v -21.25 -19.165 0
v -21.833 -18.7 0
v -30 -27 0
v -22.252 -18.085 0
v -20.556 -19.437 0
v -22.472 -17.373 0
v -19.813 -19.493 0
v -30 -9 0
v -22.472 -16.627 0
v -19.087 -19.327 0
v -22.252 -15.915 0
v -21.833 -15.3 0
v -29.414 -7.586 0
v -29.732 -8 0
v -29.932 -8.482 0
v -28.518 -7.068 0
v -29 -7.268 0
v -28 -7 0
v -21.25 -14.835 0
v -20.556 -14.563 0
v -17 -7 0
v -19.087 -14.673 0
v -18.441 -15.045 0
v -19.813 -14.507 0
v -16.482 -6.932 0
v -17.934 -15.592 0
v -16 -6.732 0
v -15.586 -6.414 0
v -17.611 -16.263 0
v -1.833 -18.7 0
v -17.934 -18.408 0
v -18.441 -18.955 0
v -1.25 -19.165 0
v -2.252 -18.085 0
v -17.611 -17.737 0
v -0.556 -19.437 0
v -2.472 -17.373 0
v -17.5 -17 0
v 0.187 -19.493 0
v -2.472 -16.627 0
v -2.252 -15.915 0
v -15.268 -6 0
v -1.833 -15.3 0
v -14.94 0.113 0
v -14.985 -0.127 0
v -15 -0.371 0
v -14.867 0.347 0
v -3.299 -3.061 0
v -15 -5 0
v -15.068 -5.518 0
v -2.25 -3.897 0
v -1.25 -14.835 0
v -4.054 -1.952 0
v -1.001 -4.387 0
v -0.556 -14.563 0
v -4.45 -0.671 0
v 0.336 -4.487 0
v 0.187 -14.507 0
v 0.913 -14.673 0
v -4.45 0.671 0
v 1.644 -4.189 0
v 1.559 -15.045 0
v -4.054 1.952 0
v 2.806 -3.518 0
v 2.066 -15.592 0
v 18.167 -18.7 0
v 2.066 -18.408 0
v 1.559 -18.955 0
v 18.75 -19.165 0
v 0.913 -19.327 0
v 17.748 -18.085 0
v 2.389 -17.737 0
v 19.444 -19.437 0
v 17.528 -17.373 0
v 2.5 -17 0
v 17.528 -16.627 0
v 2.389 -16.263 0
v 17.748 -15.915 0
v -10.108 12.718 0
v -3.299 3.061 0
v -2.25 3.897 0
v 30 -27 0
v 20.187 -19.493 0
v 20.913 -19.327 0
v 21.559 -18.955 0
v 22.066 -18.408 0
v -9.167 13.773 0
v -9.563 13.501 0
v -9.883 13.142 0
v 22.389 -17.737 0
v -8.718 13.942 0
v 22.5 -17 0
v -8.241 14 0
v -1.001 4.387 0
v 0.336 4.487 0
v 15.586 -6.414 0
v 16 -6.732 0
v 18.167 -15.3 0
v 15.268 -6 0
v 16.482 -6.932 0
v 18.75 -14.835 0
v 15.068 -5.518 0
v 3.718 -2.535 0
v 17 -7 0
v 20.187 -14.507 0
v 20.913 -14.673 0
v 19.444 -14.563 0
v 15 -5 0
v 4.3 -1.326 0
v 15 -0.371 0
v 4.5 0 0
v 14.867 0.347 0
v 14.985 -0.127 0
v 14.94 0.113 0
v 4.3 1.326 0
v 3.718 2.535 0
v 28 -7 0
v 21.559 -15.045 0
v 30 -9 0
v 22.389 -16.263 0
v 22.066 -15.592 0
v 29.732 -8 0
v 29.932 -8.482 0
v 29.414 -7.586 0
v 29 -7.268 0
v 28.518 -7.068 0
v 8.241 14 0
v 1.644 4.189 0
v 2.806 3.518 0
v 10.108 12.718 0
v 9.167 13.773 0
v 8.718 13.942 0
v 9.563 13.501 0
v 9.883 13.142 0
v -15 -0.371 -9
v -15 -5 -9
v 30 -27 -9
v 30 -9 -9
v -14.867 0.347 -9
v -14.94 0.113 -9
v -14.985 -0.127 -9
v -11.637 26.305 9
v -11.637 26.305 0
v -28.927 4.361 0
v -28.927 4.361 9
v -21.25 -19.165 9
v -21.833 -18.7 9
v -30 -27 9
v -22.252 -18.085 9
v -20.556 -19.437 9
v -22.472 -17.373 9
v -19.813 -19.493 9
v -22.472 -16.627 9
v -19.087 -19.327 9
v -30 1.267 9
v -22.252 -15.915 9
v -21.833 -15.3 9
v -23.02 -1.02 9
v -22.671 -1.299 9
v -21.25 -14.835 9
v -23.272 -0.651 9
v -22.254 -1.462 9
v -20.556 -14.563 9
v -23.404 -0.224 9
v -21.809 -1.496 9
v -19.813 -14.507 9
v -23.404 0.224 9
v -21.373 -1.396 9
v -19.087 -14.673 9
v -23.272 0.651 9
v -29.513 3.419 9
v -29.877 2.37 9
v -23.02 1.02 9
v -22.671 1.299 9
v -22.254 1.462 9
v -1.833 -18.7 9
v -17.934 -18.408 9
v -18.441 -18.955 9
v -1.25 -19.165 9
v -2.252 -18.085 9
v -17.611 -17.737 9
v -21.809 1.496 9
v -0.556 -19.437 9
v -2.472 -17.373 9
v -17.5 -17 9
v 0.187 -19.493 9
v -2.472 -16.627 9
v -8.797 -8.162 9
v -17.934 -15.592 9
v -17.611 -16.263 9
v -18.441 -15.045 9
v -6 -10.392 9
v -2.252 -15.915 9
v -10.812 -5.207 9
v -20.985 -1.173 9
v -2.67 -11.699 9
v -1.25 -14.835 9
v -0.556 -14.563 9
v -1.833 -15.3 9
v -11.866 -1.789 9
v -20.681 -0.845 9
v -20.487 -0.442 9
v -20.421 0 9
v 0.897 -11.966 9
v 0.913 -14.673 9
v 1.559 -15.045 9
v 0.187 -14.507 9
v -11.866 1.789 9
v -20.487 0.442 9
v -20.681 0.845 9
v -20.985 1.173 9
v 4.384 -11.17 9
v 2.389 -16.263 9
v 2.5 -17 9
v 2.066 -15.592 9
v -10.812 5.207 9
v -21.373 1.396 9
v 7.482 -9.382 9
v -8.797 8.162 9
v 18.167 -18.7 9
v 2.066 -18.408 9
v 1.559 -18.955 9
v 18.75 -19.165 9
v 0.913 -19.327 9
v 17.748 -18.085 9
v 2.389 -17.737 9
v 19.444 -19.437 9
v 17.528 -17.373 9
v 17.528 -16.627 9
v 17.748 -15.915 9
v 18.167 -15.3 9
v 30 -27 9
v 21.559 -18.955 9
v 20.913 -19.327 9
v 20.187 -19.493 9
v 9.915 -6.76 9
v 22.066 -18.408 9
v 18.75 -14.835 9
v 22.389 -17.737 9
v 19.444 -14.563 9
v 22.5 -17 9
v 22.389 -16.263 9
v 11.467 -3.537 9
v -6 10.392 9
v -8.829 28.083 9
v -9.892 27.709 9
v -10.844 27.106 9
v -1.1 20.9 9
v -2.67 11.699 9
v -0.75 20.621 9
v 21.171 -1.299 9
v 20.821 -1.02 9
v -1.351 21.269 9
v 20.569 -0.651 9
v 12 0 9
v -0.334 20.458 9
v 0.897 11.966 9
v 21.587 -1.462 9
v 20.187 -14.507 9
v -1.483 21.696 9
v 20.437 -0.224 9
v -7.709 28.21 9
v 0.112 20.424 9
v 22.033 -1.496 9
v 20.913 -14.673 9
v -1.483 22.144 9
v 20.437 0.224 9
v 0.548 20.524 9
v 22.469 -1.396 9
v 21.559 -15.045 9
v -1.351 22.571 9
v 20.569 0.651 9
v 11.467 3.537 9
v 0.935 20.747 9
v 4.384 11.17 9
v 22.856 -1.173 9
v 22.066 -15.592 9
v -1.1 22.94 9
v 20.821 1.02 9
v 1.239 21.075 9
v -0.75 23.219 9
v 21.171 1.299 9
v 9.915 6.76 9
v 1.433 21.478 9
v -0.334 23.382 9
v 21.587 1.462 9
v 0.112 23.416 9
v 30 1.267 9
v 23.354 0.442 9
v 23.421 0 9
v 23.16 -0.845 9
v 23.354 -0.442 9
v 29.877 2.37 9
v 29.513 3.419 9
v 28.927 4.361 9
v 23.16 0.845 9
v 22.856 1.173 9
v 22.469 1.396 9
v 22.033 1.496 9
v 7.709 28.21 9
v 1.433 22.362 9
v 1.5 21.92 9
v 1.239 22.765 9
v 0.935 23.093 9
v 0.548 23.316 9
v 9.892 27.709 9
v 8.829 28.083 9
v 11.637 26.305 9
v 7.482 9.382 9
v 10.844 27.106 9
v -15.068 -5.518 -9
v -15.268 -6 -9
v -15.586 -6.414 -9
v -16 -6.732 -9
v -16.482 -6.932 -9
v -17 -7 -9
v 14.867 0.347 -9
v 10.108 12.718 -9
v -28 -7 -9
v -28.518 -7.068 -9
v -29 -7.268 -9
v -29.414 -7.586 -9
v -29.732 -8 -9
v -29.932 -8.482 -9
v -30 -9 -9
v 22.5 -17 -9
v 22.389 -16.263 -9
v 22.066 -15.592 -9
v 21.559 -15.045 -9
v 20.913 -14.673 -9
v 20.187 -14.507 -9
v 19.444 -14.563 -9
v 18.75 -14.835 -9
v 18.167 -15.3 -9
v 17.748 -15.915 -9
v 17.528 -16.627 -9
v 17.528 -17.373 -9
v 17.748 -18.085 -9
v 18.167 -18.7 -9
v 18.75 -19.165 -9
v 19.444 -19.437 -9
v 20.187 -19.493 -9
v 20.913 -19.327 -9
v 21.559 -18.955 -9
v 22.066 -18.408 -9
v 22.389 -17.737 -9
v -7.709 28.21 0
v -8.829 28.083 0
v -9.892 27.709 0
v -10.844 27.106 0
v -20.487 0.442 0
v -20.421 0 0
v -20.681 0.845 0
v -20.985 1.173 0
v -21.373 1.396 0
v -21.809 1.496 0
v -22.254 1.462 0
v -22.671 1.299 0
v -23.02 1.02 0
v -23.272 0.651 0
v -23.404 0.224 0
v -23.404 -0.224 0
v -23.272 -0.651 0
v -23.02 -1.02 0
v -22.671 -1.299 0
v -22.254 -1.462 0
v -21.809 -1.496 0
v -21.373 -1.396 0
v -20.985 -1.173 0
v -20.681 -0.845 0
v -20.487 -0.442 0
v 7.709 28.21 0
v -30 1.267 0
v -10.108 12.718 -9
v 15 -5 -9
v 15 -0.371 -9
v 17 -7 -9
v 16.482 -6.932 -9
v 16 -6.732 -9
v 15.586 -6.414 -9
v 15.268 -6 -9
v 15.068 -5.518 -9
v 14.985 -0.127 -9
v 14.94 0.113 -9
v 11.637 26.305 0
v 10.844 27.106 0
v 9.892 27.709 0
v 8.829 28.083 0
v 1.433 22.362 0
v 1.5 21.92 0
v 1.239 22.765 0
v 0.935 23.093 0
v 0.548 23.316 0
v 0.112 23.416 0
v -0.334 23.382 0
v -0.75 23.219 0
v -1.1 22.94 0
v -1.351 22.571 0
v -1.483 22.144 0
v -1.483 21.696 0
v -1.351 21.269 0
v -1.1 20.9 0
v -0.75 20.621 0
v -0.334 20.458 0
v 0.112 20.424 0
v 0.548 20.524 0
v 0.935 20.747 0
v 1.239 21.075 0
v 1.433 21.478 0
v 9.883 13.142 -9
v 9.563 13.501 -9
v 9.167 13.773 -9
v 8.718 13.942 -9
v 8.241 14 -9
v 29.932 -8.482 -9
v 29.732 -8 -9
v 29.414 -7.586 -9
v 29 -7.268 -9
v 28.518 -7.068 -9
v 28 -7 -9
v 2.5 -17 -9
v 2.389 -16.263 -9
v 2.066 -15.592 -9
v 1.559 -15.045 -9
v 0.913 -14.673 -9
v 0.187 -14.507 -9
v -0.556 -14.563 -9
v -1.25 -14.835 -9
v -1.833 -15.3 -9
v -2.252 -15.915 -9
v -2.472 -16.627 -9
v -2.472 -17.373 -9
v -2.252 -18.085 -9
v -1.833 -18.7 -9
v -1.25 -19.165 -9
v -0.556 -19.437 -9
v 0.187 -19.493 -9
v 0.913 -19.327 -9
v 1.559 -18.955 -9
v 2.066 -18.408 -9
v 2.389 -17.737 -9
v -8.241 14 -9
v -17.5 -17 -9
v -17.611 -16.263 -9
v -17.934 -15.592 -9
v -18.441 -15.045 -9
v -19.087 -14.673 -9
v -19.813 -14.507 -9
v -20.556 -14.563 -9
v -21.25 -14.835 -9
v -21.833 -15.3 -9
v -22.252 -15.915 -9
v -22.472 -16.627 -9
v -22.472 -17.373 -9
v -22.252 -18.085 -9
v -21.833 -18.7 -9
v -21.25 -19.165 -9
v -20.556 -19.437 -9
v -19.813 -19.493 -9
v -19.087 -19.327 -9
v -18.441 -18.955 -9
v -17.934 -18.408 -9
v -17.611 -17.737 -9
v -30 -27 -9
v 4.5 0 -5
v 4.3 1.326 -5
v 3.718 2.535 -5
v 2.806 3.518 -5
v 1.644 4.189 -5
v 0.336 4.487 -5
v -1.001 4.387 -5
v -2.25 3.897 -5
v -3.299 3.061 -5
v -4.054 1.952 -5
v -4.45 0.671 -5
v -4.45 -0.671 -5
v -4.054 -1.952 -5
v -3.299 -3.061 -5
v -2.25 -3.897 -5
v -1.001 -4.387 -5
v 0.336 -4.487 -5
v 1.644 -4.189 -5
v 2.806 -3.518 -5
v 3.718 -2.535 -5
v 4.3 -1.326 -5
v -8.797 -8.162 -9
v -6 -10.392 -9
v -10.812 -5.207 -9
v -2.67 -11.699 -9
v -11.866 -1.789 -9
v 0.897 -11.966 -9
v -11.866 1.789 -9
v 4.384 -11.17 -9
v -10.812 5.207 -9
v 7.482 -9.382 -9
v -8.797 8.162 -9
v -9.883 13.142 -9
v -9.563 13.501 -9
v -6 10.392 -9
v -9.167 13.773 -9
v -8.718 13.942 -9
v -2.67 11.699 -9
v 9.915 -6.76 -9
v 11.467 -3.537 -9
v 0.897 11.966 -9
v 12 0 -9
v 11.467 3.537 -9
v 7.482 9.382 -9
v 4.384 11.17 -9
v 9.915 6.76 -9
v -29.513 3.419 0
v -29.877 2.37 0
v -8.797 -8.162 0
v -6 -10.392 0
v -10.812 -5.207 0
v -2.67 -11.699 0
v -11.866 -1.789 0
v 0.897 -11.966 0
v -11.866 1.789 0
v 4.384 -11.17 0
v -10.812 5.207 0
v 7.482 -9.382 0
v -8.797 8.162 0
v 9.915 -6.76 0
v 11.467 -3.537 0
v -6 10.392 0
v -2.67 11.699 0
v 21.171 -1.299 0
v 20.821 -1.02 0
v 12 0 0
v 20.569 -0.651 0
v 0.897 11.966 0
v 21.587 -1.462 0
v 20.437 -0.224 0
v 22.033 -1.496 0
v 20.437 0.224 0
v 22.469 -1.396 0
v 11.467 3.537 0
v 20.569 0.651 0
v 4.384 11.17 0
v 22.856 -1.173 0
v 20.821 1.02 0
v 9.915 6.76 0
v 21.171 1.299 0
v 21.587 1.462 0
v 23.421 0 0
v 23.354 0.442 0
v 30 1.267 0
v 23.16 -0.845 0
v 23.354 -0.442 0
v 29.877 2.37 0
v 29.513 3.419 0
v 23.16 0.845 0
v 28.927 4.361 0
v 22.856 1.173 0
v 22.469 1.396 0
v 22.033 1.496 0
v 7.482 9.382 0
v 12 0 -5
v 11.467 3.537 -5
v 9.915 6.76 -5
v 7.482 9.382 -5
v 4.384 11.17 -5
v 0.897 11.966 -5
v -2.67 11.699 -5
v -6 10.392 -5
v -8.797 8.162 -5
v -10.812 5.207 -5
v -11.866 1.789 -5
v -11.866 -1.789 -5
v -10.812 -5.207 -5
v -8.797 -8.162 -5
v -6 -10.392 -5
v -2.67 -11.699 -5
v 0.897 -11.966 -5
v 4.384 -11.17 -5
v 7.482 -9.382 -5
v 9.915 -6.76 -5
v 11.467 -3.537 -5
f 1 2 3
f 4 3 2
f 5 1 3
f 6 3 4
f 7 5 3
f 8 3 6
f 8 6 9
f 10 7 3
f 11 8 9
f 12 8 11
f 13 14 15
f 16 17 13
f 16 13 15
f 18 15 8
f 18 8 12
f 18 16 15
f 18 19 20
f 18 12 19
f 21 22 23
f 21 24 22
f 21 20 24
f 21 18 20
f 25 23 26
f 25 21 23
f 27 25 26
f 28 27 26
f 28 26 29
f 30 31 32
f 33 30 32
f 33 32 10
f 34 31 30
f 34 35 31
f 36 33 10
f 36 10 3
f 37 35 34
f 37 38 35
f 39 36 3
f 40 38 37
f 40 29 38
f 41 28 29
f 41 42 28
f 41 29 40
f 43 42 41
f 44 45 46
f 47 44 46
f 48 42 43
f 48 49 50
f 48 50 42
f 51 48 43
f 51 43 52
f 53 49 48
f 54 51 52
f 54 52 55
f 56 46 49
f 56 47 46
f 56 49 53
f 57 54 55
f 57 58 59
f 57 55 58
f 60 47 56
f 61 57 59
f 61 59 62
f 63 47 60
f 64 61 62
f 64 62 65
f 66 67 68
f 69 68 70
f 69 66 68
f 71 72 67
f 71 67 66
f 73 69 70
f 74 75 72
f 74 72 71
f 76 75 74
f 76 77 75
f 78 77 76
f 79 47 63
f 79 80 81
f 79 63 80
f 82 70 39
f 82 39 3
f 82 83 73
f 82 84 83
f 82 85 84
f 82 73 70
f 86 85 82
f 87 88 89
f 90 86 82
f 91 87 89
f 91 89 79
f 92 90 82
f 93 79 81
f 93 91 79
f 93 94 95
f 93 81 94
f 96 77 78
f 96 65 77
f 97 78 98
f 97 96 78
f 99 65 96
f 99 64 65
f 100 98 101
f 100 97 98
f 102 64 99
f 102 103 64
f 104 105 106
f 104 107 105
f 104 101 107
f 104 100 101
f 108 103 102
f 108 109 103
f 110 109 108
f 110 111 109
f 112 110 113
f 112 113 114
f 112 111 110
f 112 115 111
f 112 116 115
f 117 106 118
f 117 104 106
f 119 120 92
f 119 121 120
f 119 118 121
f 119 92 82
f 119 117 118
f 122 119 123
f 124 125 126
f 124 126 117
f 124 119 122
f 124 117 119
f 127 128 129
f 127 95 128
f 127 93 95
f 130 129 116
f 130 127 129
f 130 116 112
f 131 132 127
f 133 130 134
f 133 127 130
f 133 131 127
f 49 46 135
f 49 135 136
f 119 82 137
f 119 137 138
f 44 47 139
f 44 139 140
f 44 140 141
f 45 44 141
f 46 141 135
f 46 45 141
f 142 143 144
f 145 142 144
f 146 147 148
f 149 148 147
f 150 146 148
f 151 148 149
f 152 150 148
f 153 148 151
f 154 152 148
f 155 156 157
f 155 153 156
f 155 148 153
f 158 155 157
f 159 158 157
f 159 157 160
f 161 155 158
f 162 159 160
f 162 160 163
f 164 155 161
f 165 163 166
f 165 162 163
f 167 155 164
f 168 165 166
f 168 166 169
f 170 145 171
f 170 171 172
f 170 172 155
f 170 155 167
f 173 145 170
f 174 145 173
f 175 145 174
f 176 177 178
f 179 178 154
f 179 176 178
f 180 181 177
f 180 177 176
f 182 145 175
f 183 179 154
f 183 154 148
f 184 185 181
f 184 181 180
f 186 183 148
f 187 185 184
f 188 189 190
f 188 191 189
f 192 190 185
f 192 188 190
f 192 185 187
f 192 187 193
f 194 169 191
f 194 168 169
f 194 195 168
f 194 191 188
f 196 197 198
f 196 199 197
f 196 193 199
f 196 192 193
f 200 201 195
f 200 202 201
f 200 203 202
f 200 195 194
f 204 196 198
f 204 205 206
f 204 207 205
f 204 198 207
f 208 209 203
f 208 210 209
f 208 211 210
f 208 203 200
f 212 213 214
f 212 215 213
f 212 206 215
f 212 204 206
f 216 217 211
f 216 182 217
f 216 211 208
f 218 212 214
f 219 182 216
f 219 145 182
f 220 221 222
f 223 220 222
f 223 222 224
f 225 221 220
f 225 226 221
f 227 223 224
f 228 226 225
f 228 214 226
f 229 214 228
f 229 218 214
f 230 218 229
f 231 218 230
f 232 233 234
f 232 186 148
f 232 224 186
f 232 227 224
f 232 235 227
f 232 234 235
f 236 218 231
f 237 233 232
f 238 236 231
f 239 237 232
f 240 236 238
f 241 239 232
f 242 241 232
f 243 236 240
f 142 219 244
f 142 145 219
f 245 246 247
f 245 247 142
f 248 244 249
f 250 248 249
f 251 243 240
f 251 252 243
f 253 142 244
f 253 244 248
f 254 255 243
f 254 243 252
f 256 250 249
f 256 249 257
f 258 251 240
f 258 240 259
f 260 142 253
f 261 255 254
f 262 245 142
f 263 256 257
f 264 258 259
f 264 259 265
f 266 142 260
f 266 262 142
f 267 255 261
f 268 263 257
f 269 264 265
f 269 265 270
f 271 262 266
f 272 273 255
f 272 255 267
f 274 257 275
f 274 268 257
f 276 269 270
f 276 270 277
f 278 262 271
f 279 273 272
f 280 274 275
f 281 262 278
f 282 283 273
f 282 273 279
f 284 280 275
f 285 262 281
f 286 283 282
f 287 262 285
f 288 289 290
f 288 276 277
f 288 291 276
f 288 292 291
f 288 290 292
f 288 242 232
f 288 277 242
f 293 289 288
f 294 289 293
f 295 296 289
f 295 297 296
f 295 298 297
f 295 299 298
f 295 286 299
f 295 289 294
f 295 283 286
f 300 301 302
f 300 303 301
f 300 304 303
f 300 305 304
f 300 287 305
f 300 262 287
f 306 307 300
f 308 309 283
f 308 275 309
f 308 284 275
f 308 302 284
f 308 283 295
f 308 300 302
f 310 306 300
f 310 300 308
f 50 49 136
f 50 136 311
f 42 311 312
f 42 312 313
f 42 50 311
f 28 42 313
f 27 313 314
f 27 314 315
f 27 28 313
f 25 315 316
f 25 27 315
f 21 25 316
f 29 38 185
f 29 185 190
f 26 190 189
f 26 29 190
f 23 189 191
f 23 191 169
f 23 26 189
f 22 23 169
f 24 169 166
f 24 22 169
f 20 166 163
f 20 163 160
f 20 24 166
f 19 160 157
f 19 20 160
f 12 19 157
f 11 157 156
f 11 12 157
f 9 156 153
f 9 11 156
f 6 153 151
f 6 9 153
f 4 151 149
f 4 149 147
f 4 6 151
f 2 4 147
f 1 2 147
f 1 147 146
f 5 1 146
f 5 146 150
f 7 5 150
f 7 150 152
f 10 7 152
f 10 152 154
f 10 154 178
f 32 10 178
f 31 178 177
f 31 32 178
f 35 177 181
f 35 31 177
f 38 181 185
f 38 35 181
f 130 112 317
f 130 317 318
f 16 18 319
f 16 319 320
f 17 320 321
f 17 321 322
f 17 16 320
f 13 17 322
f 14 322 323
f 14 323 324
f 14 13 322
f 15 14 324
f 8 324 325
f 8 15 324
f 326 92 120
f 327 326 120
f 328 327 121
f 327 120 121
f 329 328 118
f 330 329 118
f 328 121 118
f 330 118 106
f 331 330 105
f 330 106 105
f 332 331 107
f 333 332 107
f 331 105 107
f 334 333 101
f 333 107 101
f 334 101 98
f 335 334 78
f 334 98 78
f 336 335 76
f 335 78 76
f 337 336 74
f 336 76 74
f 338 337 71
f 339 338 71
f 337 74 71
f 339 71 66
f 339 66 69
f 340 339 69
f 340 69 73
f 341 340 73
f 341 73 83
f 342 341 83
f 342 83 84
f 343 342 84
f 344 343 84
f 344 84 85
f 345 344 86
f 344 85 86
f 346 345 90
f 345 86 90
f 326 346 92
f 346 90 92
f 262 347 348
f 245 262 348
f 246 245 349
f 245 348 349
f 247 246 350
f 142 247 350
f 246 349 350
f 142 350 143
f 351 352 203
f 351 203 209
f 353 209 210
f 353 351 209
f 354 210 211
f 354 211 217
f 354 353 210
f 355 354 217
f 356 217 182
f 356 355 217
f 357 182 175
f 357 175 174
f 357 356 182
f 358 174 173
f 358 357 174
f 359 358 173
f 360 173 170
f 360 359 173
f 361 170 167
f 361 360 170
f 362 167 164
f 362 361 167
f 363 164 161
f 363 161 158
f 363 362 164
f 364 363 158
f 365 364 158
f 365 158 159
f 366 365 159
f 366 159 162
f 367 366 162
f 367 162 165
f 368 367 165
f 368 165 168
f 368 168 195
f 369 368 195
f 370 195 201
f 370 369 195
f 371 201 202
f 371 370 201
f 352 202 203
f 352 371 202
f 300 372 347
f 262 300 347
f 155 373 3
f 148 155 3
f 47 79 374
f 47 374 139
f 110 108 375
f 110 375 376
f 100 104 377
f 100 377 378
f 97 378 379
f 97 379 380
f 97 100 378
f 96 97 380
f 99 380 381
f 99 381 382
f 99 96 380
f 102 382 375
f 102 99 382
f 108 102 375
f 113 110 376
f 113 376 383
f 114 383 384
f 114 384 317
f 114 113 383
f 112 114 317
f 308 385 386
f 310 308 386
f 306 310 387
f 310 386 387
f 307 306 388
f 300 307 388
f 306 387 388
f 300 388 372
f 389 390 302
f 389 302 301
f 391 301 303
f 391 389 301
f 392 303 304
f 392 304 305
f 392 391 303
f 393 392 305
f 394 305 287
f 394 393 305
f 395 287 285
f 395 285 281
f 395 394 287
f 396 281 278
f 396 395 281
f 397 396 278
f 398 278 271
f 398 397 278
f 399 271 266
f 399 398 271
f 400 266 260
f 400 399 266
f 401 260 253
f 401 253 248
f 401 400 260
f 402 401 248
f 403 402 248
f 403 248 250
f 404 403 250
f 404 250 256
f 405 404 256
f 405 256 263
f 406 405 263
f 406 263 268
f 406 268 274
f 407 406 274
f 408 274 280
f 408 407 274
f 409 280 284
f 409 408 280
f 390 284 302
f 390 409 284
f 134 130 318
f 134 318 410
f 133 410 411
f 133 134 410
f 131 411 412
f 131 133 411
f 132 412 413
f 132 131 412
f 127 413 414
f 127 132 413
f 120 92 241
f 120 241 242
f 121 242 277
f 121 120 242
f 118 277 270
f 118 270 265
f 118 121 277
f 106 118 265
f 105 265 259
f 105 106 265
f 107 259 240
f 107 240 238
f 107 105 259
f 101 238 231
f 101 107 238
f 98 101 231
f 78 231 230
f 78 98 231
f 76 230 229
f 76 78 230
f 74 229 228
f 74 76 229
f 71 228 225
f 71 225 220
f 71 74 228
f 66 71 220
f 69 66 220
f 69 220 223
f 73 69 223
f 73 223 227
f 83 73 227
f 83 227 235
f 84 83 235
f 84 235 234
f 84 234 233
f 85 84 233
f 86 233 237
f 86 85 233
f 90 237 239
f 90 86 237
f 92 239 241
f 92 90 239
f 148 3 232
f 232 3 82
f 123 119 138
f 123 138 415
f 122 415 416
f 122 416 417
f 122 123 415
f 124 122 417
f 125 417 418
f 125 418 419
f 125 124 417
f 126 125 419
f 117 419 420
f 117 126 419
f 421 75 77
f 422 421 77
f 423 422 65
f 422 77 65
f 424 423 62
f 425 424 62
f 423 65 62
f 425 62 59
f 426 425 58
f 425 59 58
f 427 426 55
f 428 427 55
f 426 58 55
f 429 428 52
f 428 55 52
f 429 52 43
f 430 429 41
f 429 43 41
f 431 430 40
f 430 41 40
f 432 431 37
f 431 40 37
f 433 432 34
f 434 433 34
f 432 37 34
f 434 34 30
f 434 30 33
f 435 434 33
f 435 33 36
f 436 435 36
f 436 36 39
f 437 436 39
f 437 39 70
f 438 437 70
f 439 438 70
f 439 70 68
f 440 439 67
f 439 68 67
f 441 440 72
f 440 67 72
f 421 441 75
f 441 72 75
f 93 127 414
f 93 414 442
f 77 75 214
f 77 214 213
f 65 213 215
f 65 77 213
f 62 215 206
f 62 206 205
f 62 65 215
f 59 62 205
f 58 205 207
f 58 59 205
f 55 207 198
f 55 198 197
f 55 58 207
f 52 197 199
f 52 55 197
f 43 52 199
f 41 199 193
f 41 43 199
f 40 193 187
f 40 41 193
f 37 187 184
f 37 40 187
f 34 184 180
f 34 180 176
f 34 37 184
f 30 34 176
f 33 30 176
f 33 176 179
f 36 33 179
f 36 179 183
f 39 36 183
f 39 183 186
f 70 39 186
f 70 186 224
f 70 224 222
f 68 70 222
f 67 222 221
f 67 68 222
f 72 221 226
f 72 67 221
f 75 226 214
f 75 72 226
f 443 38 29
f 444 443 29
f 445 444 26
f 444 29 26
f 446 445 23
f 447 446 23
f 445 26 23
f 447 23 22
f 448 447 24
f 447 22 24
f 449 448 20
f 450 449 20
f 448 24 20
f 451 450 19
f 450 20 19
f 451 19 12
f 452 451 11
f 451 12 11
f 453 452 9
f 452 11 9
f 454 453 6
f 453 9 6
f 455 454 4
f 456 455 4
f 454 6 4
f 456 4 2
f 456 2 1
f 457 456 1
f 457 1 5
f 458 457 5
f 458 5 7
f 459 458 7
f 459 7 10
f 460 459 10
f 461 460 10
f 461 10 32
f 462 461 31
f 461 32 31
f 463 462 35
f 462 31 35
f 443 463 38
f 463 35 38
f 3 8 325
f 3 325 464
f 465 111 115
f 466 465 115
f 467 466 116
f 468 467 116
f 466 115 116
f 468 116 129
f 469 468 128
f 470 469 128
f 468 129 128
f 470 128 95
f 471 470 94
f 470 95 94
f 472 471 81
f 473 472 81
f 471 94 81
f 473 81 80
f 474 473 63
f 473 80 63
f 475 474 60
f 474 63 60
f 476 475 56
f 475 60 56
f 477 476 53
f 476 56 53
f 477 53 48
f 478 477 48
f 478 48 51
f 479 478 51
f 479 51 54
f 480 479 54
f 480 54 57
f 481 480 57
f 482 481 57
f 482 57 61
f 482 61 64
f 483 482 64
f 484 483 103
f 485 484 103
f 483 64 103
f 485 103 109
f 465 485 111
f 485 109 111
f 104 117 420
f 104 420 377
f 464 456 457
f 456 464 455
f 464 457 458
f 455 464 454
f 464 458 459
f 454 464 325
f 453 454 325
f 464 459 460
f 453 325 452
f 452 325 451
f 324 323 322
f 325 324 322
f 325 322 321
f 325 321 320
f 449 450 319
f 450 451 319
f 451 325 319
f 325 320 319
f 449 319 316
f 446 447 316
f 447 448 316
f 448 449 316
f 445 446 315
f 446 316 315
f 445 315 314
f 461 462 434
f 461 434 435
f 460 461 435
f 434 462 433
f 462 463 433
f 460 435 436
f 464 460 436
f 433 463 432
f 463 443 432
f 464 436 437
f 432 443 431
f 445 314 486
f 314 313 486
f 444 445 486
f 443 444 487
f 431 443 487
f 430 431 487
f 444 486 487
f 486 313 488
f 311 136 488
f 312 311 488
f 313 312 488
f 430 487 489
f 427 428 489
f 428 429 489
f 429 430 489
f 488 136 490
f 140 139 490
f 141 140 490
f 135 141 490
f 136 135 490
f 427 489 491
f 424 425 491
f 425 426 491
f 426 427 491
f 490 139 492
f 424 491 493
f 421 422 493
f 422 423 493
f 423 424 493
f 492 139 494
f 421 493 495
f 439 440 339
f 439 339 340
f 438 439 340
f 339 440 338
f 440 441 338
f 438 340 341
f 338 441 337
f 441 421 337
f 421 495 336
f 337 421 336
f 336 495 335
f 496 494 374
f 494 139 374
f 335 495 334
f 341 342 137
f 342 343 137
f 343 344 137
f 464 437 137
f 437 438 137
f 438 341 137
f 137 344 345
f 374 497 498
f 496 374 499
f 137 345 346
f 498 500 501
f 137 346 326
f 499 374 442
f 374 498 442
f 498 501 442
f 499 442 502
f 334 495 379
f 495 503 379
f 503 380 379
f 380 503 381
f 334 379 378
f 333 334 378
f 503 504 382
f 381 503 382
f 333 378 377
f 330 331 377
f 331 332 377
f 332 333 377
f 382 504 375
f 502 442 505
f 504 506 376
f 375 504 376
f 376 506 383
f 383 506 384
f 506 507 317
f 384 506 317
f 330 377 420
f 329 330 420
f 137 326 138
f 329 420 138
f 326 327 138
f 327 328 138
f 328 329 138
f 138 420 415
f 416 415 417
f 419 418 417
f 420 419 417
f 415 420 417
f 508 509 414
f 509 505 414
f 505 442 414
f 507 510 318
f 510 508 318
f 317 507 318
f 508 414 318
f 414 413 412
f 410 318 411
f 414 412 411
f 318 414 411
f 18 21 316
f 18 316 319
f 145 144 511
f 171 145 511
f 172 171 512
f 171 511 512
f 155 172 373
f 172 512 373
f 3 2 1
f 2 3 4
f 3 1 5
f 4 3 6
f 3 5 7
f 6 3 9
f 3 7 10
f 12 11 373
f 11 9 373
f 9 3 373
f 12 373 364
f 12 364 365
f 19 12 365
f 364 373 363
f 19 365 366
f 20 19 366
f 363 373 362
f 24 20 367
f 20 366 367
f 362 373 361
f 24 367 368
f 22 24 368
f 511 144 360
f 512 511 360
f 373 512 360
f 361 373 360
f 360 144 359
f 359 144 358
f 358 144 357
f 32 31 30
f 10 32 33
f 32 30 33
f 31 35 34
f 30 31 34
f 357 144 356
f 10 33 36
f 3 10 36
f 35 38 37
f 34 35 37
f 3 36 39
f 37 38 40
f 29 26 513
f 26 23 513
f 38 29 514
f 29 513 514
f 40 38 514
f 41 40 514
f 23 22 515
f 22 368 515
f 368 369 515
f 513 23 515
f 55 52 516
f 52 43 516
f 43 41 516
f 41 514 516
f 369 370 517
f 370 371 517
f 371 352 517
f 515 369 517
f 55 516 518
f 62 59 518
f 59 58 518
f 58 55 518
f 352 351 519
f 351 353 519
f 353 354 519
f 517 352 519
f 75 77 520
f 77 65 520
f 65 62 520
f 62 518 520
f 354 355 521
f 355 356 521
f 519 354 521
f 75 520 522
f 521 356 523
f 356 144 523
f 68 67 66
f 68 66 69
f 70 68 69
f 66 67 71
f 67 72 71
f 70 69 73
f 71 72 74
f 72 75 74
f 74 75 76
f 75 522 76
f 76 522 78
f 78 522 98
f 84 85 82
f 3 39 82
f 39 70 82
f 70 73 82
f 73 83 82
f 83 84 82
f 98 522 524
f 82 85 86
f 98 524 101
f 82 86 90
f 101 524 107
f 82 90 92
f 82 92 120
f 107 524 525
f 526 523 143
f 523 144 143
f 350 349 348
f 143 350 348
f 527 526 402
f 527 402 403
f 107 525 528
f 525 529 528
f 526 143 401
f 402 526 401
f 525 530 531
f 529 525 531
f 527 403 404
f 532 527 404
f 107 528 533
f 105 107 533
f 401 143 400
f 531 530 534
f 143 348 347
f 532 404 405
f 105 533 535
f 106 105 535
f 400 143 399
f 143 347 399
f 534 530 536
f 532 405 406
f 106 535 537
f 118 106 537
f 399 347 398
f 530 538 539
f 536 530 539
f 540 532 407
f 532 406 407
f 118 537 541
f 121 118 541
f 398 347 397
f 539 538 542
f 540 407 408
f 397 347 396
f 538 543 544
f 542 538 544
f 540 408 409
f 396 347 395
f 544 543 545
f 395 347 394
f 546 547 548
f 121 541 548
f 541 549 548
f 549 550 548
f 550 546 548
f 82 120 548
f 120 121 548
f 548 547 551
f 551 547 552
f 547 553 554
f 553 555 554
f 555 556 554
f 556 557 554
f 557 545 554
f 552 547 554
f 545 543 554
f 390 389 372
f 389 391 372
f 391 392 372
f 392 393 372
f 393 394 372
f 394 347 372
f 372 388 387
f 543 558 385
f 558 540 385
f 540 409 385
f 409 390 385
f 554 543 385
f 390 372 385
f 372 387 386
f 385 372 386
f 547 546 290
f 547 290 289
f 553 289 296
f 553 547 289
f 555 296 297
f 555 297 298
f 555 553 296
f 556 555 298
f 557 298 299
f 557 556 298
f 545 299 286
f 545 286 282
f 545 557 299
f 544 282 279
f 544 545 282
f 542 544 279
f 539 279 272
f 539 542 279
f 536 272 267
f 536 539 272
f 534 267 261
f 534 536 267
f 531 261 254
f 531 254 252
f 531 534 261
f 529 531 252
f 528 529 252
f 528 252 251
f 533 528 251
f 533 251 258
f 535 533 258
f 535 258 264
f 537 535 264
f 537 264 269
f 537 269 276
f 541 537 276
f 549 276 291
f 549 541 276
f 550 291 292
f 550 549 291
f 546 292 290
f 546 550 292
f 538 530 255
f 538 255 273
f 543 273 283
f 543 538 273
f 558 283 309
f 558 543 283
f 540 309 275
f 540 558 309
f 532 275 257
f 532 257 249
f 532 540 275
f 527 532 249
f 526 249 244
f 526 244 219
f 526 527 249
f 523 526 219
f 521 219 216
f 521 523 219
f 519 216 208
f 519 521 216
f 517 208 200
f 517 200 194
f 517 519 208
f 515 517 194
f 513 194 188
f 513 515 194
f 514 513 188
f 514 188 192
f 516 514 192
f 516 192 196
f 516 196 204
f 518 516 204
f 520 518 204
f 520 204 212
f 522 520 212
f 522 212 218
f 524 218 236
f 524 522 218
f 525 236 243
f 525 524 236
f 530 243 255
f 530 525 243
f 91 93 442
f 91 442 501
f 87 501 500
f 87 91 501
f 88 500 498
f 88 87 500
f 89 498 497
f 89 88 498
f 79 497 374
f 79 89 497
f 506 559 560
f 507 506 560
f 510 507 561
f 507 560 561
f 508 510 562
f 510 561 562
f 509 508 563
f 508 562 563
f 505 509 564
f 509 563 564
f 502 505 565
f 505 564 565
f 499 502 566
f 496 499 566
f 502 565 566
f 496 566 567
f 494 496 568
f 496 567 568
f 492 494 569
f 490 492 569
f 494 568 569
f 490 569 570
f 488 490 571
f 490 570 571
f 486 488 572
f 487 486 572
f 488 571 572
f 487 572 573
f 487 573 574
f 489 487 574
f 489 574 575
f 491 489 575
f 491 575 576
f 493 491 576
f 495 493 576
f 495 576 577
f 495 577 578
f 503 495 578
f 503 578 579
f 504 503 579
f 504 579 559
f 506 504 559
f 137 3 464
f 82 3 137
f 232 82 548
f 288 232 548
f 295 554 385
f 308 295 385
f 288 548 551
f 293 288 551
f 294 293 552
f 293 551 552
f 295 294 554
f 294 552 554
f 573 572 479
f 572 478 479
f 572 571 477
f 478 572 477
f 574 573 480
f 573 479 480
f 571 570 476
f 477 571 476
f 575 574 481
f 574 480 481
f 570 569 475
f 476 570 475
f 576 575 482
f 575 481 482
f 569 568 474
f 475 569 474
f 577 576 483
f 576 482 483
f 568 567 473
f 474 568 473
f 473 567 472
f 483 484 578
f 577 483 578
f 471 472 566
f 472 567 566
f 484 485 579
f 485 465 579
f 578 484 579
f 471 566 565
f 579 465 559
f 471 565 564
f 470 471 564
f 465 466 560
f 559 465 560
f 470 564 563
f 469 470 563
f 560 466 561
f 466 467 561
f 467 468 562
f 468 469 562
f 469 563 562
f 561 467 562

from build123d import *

# Parameters (mm, degrees)
F0_R     = 2.5
F0_R_2   = 1.5
F0_R_3   = 12
F2_DEPTH = 9
F1_R     = 2.5
F1_R_2   = 12
F3_DEPTH = 9
F1_R_3   = 4.5
F4_DEPTH = 5


with BuildPart() as f2:
    # F0 (on Top) → F2 (new body)
    with BuildSketch(Plane.XY):
        with BuildLine():
            Line((-1.4435148332, 28.2101202756), (-7.7092999779, 28.2101202756))
            ThreePointArc((-7.7092999779, 28.2101202756), (-9.8918540281, 27.7086153371), (-11.6365834243, 26.3047034029))
            Line((-11.6365834243, 26.3047034029), (-28.9272834464, 4.3613665526))
            ThreePointArc((-28.9272834464, 4.3613665526), (-29.7242151323, 2.9044010192), (-30, 1.2667834253))
            Line((-30, 1.2667834253), (-30, 0))
            Line((-30, 0), (-30, -27))
            Line((-30, -27), (30, -27))
            Line((30, -27), (30, 0))
            Line((30, 0), (30, 1.2667834253))
            ThreePointArc((30, 1.2667834253), (29.7242151323, 2.9044010192), (28.9272834464, 4.3613665526))
            Line((28.9272834464, 4.3613665526), (11.6365834243, 26.3047034029))
            ThreePointArc((11.6365834243, 26.3047034029), (9.8918540281, 27.7086153371), (7.7092999779, 28.2101202756))
            Line((7.7092999779, 28.2101202756), (-1.4435148332, 28.2101202756))
        make_face()
        with Locations((-20, -17)):
            Circle(F0_R, mode=Mode.SUBTRACT)
        with Locations((-21.9206204292, 0)):
            Circle(F0_R_2, mode=Mode.SUBTRACT)
        with Locations((0, -17)):
            Circle(F0_R, mode=Mode.SUBTRACT)
        with Locations((20, -17)):
            Circle(F0_R, mode=Mode.SUBTRACT)
        Circle(F0_R_3, mode=Mode.SUBTRACT)
        with Locations((21.9206204292, 0)):
            Circle(F0_R_2, mode=Mode.SUBTRACT)
        with Locations((0, 21.92)):
            Circle(F0_R_2, mode=Mode.SUBTRACT)
    extrude(amount=F2_DEPTH)


with BuildPart() as f3:
    # F1 (on Top) → F3 (new body)
    with BuildSketch(Plane.XY):
        with BuildLine():
            ThreePointArc((-28, -7), (-29.4142135624, -7.5857864376), (-30, -9))
            Line((-30, -9), (-30, -27))
            Line((-30, -27), (30, -27))
            Line((30, -27), (30, -9))
            ThreePointArc((30, -9), (29.4142135624, -7.5857864376), (28, -7))
            Line((28, -7), (17, -7))
            ThreePointArc((17, -7), (15.5857864376, -6.4142135624), (15, -5))
            Line((15, -5), (15, -0.3713906764))
            ThreePointArc((15, -0.3713906764), (14.9663841605, -0.0062423047), (14.8666666667, 0.3466312979))
            Line((14.8666666667, 0.3466312979), (10.1079539748, 12.7180219743))
            ThreePointArc((10.1079539748, 12.7180219743), (9.3735319927, 13.6486424641), (8.2412873082, 14))
            Line((8.2412873082, 14), (0, 14))
            Line((0, 14), (-8.2412873082, 14))
            ThreePointArc((-8.2412873082, 14), (-9.3735319927, 13.6486424641), (-10.1079539748, 12.7180219743))
            Line((-10.1079539748, 12.7180219743), (-14.8666666667, 0.3466312979))
            ThreePointArc((-14.8666666667, 0.3466312979), (-14.9663841605, -0.0062423047), (-15, -0.3713906764))
            Line((-15, -0.3713906764), (-15, -5))
            ThreePointArc((-15, -5), (-15.5857864376, -6.4142135624), (-17, -7))
            Line((-17, -7), (-28, -7))
        make_face()
        with Locations((-20, -17)):
            Circle(F1_R, mode=Mode.SUBTRACT)
        with Locations((0, -17)):
            Circle(F1_R, mode=Mode.SUBTRACT)
        with Locations((20, -17)):
            Circle(F1_R, mode=Mode.SUBTRACT)
        Circle(F1_R_2, mode=Mode.SUBTRACT)
    extrude(amount=-F3_DEPTH)

    # F1 (on Top) → F4 (join)
    with BuildSketch(Plane.XY):
        Circle(F1_R_2)
        Circle(F1_R_3, mode=Mode.SUBTRACT)
    extrude(amount=-F4_DEPTH)


solid = Compound([f2.part, f3.part])
